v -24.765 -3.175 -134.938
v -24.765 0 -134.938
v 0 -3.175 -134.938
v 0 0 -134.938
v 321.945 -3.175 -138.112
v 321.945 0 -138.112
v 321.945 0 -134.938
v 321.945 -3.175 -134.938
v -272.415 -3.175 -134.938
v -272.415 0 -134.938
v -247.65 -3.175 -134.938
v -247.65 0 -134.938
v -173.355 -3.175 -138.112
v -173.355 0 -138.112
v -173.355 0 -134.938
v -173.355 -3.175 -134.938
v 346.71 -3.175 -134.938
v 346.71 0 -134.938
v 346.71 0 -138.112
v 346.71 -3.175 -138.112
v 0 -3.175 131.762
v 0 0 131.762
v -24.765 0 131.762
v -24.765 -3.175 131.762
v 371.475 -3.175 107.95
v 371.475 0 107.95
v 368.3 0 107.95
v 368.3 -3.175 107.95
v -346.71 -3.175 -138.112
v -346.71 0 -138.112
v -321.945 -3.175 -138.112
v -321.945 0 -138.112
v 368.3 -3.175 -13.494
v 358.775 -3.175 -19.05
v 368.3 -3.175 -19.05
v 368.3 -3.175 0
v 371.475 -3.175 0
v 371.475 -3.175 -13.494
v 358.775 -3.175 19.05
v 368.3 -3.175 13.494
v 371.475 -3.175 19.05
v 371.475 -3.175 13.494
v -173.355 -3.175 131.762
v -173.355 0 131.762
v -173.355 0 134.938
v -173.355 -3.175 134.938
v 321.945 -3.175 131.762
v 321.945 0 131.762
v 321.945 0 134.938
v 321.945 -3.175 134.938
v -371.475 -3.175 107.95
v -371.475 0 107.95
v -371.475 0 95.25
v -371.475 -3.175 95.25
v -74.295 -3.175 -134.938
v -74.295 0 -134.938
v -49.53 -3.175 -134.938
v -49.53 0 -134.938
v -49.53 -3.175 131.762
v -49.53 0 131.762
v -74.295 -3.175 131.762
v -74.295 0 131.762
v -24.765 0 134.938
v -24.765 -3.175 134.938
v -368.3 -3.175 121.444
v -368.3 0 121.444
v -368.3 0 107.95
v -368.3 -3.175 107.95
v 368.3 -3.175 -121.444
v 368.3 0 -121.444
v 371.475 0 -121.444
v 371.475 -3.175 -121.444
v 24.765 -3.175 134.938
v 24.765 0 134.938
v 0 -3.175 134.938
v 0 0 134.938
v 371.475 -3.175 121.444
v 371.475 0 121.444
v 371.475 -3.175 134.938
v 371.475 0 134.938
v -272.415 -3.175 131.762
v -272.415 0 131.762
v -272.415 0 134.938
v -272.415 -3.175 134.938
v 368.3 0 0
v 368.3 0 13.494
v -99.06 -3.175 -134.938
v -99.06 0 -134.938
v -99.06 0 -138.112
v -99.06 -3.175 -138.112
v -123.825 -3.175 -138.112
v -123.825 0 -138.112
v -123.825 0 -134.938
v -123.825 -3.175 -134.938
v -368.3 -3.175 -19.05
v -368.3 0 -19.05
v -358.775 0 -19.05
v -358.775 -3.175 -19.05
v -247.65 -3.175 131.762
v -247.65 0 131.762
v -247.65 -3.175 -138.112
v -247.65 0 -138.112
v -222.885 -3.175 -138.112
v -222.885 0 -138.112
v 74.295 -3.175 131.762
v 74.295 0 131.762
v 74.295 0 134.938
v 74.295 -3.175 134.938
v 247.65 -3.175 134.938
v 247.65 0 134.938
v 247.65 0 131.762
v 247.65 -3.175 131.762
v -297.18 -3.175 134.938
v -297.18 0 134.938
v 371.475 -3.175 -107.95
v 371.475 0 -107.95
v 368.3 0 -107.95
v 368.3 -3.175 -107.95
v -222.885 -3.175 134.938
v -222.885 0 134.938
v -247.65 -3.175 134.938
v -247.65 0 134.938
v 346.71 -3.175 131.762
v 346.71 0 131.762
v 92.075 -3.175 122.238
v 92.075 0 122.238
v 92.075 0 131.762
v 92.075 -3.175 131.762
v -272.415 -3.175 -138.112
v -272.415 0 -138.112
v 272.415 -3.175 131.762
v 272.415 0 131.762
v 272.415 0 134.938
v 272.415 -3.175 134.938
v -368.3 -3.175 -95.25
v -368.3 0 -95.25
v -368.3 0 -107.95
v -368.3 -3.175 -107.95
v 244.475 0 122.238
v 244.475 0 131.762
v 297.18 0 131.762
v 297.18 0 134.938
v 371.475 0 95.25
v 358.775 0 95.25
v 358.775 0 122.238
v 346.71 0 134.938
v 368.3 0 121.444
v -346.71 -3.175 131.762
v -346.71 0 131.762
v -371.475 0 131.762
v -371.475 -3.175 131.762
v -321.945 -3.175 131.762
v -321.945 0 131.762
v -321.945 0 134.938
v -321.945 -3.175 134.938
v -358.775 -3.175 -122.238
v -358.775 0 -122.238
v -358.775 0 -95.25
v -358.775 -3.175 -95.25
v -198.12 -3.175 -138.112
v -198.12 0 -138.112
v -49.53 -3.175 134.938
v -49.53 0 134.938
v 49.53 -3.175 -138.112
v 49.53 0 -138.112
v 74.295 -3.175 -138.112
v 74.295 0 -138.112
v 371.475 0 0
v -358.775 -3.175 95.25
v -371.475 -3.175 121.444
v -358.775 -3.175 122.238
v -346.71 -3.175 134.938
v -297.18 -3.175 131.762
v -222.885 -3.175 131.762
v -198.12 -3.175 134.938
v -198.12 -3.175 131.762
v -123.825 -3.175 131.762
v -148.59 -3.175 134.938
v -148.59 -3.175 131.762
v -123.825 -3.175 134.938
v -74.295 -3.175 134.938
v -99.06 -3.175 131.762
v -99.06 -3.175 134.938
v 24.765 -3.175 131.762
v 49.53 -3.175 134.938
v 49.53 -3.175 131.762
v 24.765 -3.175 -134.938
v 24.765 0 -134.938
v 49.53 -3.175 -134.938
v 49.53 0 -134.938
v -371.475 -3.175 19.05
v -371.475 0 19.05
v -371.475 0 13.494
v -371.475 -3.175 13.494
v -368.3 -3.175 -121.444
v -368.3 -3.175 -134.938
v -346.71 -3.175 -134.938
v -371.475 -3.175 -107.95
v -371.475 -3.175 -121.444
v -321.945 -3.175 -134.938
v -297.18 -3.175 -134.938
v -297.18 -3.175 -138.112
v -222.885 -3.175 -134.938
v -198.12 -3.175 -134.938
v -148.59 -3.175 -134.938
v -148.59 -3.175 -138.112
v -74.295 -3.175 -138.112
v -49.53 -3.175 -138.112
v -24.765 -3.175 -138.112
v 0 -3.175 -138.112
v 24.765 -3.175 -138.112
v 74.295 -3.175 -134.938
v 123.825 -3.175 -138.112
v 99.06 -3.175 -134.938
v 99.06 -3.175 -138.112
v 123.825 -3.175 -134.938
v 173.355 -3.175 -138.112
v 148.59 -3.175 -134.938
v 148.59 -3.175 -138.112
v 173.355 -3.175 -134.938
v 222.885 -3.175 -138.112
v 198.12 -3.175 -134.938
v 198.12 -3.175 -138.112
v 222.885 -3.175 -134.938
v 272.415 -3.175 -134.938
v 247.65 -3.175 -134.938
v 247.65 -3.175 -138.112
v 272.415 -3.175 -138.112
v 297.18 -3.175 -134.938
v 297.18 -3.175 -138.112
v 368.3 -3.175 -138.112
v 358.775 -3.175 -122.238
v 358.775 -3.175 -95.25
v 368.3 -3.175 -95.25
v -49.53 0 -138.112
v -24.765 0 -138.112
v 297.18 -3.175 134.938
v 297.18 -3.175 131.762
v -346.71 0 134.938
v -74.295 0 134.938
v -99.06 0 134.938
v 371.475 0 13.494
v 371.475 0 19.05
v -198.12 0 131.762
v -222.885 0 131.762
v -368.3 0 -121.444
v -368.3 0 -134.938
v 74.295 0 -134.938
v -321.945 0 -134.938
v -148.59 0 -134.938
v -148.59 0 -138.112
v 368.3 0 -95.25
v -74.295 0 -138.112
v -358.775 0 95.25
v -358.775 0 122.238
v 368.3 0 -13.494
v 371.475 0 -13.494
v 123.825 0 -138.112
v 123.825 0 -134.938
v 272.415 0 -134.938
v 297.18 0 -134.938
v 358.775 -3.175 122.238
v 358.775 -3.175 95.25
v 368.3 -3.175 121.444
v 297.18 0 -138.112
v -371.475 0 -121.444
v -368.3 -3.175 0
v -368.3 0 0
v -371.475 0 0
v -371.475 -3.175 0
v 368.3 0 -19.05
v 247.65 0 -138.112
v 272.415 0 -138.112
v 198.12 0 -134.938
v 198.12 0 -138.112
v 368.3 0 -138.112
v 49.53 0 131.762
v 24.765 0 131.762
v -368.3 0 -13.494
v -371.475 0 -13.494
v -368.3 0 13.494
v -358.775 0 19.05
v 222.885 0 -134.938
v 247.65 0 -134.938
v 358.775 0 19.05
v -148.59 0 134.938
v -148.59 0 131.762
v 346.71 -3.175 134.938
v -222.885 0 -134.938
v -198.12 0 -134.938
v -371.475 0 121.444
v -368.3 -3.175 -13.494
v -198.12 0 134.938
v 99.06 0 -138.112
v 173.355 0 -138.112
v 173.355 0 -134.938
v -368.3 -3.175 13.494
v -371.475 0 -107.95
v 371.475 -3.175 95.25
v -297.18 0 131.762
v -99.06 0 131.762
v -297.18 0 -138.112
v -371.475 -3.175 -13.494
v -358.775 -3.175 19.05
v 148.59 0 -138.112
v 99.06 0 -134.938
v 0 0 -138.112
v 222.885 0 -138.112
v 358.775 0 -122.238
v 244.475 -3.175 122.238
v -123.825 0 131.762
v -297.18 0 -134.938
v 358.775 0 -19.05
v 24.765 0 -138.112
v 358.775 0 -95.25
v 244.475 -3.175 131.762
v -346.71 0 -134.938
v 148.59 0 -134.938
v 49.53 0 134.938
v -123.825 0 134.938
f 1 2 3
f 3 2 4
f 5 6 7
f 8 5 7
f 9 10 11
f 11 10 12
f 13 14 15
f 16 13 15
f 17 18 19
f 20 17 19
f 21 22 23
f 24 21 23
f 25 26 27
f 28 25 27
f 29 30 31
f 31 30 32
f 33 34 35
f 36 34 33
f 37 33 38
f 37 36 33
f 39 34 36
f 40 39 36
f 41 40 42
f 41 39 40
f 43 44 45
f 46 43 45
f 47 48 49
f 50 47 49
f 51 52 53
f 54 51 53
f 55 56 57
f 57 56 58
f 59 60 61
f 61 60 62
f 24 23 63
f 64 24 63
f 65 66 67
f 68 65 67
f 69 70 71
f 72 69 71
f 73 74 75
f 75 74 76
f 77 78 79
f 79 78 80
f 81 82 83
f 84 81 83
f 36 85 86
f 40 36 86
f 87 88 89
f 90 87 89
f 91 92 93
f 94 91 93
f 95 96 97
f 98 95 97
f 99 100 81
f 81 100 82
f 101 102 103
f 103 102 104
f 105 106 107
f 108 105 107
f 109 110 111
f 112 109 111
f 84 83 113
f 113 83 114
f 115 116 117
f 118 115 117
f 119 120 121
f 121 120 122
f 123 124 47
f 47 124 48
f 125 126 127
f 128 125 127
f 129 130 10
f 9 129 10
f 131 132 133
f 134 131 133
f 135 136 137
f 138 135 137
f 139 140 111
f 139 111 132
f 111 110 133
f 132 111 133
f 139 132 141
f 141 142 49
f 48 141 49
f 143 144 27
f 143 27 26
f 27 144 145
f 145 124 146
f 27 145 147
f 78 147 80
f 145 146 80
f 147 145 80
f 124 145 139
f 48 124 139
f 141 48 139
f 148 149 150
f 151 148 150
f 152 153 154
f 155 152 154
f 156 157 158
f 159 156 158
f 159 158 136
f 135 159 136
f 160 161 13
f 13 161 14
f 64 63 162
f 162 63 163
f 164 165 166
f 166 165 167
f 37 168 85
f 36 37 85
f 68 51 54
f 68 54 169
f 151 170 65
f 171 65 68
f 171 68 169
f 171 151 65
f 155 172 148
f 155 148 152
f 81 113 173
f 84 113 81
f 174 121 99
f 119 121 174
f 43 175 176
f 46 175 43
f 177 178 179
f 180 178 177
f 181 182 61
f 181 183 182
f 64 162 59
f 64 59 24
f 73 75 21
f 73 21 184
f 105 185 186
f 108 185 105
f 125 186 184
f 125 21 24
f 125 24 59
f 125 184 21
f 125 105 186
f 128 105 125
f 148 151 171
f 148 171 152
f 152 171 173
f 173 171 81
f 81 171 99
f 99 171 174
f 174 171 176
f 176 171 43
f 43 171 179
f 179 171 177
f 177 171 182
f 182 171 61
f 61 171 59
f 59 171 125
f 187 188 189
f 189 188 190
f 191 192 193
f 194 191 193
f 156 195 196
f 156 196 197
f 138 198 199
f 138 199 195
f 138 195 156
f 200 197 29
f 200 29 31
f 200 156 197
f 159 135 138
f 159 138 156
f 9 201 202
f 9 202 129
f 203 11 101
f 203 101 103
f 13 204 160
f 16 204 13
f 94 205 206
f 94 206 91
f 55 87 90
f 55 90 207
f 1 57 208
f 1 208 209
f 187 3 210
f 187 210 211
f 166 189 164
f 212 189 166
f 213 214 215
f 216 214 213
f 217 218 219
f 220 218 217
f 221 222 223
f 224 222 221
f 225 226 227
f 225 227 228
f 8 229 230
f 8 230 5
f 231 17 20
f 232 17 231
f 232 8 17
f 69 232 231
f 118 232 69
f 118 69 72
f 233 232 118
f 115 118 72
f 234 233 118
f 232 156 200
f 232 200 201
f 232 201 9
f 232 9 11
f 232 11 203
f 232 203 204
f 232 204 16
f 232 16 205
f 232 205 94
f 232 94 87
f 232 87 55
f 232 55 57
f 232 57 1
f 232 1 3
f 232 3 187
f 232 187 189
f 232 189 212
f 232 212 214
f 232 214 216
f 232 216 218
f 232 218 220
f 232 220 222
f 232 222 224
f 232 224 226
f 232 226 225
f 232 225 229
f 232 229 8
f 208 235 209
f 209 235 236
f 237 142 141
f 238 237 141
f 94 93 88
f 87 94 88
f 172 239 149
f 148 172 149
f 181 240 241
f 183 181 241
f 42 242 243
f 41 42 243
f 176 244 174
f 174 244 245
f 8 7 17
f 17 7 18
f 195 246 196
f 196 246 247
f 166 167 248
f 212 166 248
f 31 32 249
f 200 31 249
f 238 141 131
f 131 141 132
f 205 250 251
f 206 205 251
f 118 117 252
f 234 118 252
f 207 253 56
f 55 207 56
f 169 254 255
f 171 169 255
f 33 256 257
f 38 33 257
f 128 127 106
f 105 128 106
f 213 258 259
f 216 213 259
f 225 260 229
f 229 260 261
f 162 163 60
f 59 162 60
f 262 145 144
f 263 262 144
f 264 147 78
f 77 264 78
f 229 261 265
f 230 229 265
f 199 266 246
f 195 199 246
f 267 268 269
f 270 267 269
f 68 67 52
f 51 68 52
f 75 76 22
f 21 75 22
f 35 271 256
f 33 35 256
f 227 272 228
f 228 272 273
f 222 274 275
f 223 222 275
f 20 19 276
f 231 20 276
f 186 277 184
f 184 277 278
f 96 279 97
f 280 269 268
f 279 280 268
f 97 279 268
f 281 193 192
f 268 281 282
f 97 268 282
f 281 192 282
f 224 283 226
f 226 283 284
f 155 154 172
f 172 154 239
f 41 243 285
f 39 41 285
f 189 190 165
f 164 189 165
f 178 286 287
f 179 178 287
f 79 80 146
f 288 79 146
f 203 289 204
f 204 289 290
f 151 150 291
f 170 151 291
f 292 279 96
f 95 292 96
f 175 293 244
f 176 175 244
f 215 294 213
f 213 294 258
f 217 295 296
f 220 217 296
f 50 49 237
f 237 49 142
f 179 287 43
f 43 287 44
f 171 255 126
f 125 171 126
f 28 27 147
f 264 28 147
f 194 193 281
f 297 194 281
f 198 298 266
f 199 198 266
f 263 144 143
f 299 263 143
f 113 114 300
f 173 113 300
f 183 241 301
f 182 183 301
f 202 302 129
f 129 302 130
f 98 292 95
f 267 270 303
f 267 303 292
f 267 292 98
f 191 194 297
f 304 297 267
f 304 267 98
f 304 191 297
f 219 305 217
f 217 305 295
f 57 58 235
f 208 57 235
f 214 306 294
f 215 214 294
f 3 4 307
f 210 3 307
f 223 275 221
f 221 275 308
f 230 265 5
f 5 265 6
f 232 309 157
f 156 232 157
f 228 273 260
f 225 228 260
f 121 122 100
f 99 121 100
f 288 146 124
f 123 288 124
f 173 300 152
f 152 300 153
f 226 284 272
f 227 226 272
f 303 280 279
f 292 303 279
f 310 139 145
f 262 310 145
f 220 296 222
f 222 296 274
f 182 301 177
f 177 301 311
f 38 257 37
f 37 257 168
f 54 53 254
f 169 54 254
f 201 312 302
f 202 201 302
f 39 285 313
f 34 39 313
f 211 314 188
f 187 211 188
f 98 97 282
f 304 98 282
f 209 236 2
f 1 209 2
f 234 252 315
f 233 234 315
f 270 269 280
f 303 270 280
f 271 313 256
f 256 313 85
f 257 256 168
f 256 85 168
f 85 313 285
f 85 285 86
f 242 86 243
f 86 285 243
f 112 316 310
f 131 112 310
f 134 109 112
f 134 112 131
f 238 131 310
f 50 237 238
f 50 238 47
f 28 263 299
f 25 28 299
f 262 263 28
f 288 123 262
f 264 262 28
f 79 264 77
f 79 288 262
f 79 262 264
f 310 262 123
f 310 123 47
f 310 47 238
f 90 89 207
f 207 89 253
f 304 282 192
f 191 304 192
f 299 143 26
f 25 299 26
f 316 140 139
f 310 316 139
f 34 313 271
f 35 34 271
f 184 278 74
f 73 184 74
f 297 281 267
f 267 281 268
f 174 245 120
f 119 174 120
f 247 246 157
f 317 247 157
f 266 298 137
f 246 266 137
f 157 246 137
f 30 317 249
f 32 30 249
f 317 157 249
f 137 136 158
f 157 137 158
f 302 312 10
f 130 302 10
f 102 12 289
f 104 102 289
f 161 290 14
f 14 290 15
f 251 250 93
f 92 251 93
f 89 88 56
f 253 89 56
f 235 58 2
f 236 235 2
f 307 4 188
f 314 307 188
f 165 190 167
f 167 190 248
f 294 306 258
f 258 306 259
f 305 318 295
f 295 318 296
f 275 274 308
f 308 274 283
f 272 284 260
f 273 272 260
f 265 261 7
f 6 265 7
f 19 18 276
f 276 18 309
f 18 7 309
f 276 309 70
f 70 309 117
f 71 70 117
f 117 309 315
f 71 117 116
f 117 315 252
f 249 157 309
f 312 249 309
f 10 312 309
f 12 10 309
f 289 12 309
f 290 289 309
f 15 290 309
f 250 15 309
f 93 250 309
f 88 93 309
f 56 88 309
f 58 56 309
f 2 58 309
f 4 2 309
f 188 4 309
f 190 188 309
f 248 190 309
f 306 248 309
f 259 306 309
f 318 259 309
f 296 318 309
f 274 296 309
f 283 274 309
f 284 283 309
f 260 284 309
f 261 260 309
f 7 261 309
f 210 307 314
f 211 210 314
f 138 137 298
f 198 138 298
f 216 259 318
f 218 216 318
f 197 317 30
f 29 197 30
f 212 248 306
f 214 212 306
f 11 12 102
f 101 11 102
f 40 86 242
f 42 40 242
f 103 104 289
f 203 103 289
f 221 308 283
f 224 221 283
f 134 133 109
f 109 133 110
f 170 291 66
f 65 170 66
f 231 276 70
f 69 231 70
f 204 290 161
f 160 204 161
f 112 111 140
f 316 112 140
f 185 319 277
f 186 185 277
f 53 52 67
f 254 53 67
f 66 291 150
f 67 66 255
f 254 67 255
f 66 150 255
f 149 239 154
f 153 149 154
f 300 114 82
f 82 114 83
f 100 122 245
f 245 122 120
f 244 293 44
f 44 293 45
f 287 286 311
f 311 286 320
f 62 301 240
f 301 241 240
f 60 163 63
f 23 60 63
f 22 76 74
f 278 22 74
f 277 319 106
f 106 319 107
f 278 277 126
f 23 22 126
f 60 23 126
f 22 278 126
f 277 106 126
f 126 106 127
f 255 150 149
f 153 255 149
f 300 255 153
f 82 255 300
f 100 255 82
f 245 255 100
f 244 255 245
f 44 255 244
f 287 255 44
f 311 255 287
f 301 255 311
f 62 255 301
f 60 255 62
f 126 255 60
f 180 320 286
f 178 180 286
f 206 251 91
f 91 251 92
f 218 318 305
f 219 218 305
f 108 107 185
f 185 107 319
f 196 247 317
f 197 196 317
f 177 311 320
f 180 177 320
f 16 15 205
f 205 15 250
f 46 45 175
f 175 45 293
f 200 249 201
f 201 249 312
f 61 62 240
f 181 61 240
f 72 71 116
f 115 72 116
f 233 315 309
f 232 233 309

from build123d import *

# Parameters (mm, degrees)
F1_DEPTH = 3.175


with BuildPart() as f1:
    # F0 (on Front) → F1 (new body)
    with BuildSketch(Plane.XZ):
        Polygon((358.775, 19.05), (358.775, -19.05), (368.3, -19.05), (368.3, -13.49375), (371.475, -13.49375), (371.475, 0), (368.3, 0), (368.3, 13.49375), (371.475, 13.49375), (371.475, 19.05), align=None)
        Polygon((-368.3, -19.05), (-358.775, -19.05), (-358.775, 19.05), (-371.475, 19.05), (-371.475, 13.49375), (-368.3, 13.49375), (-368.3, 0), (-371.475, 0), (-371.475, -13.49375), (-368.3, -13.49375), align=None)
        Polygon((358.775, -95.25), (358.775, -122.2375), (355.6, -122.2375), (355.6, -128.5875), (358.775, -128.5875), (358.775, -134.9375), (358.775, -138.1125), (365.125, -138.1125), (368.3, -138.1125), (368.3, -134.9375), (368.3, -121.44375), (371.475, -121.44375), (371.475, -107.95), (368.3, -107.95), (368.3, -95.25), (365.125, -95.25), align=None)
        Polygon((-355.6, -128.5875), (-355.6, -122.2375), (-358.775, -122.2375), (-358.775, -95.25), (-365.125, -95.25), (-368.3, -95.25), (-368.3, -107.95), (-371.475, -107.95), (-371.475, -121.44375), (-368.3, -121.44375), (-368.3, -131.7625), (-368.3, -134.9375), (-365.125, -134.9375), (-358.775, -134.9375), (-358.775, -131.7625), (-358.775, -128.5875), align=None)
        Polygon((358.775, 122.2375), (358.775, 95.25), (371.475, 95.25), (371.475, 107.95), (368.3, 107.95), (368.3, 121.44375), (371.475, 121.44375), (371.475, 134.9375), (358.775, 134.9375), (358.775, 128.5875), (355.6, 128.5875), (355.6, 122.2375), align=None)
        Polygon((244.475, 122.2375), (355.6, 122.2375), (355.6, 128.5875), (358.775, 128.5875), (358.775, 134.9375), (346.71, 134.9375), (346.71, 131.7625), (321.945, 131.7625), (321.945, 134.9375), (318.77, 134.9375), (297.18, 134.9375), (297.18, 131.7625), (272.415, 131.7625), (272.415, 134.9375), (247.65, 134.9375), (247.65, 131.7625), (244.475, 131.7625), align=None)
        Polygon((-355.6, 122.2375), (92.075, 122.2375), (92.075, 131.7625), (74.295, 131.7625), (74.295, 134.9375), (49.53, 134.9375), (49.53, 131.7625), (24.765, 131.7625), (24.765, 134.9375), (0, 134.9375), (0, 131.7625), (-24.765, 131.7625), (-24.765, 134.9375), (-49.53, 134.9375), (-49.53, 131.7625), (-74.295, 131.7625), (-74.295, 134.9375), (-99.06, 134.9375), (-99.06, 131.7625), (-123.825, 131.7625), (-123.825, 134.9375), (-148.59, 134.9375), (-148.59, 131.7625), (-173.355, 131.7625), (-173.355, 134.9375), (-198.12, 134.9375), (-198.12, 131.7625), (-222.885, 131.7625), (-222.885, 134.9375), (-247.65, 134.9375), (-247.65, 131.7625), (-272.415, 131.7625), (-272.415, 134.9375), (-297.18, 134.9375), (-297.18, 131.7625), (-321.945, 131.7625), (-321.945, 134.9375), (-346.71, 134.9375), (-346.71, 131.7625), (-358.775, 131.7625), (-358.775, 128.5875), (-355.6, 128.5875), align=None)
        Polygon((-371.475, 95.25), (-358.775, 95.25), (-358.775, 122.2375), (-355.6, 122.2375), (-355.6, 128.5875), (-358.775, 128.5875), (-358.775, 131.7625), (-371.475, 131.7625), (-371.475, 121.44375), (-368.3, 121.44375), (-368.3, 107.95), (-371.475, 107.95), align=None)
        Polygon((355.6, -128.5875), (355.6, -122.2375), (-355.6, -122.2375), (-355.6, -128.5875), (-358.775, -128.5875), (-358.775, -131.7625), (-358.775, -134.9375), (-349.885, -134.9375), (-346.71, -134.9375), (-346.71, -138.1125), (-321.945, -138.1125), (-321.945, -134.9375), (-297.18, -134.9375), (-297.18, -138.1125), (-272.415, -138.1125), (-272.415, -134.9375), (-247.65, -134.9375), (-247.65, -138.1125), (-222.885, -138.1125), (-222.885, -134.9375), (-198.12, -134.9375), (-198.12, -138.1125), (-173.355, -138.1125), (-173.355, -134.9375), (-148.59, -134.9375), (-148.59, -138.1125), (-123.825, -138.1125), (-123.825, -134.9375), (-99.06, -134.9375), (-99.06, -138.1125), (-74.295, -138.1125), (-74.295, -134.9375), (-49.53, -134.9375), (-49.53, -138.1125), (-24.765, -138.1125), (-24.765, -134.9375), (0, -134.9375), (0, -138.1125), (24.765, -138.1125), (24.765, -134.9375), (49.53, -134.9375), (49.53, -138.1125), (74.295, -138.1125), (74.295, -134.9375), (99.06, -134.9375), (99.06, -138.1125), (123.825, -138.1125), (123.825, -134.9375), (148.59, -134.9375), (148.59, -138.1125), (173.355, -138.1125), (173.355, -134.9375), (198.12, -134.9375), (198.12, -138.1125), (222.885, -138.1125), (222.885, -134.9375), (247.65, -134.9375), (247.65, -138.1125), (272.415, -138.1125), (272.415, -134.9375), (297.18, -134.9375), (297.18, -138.1125), (321.945, -138.1125), (321.945, -134.9375), (346.71, -134.9375), (346.71, -138.1125), (349.885, -138.1125), (358.775, -138.1125), (358.775, -134.9375), (358.775, -128.5875), align=None)
    extrude(amount=F1_DEPTH)


solid = f1.part
